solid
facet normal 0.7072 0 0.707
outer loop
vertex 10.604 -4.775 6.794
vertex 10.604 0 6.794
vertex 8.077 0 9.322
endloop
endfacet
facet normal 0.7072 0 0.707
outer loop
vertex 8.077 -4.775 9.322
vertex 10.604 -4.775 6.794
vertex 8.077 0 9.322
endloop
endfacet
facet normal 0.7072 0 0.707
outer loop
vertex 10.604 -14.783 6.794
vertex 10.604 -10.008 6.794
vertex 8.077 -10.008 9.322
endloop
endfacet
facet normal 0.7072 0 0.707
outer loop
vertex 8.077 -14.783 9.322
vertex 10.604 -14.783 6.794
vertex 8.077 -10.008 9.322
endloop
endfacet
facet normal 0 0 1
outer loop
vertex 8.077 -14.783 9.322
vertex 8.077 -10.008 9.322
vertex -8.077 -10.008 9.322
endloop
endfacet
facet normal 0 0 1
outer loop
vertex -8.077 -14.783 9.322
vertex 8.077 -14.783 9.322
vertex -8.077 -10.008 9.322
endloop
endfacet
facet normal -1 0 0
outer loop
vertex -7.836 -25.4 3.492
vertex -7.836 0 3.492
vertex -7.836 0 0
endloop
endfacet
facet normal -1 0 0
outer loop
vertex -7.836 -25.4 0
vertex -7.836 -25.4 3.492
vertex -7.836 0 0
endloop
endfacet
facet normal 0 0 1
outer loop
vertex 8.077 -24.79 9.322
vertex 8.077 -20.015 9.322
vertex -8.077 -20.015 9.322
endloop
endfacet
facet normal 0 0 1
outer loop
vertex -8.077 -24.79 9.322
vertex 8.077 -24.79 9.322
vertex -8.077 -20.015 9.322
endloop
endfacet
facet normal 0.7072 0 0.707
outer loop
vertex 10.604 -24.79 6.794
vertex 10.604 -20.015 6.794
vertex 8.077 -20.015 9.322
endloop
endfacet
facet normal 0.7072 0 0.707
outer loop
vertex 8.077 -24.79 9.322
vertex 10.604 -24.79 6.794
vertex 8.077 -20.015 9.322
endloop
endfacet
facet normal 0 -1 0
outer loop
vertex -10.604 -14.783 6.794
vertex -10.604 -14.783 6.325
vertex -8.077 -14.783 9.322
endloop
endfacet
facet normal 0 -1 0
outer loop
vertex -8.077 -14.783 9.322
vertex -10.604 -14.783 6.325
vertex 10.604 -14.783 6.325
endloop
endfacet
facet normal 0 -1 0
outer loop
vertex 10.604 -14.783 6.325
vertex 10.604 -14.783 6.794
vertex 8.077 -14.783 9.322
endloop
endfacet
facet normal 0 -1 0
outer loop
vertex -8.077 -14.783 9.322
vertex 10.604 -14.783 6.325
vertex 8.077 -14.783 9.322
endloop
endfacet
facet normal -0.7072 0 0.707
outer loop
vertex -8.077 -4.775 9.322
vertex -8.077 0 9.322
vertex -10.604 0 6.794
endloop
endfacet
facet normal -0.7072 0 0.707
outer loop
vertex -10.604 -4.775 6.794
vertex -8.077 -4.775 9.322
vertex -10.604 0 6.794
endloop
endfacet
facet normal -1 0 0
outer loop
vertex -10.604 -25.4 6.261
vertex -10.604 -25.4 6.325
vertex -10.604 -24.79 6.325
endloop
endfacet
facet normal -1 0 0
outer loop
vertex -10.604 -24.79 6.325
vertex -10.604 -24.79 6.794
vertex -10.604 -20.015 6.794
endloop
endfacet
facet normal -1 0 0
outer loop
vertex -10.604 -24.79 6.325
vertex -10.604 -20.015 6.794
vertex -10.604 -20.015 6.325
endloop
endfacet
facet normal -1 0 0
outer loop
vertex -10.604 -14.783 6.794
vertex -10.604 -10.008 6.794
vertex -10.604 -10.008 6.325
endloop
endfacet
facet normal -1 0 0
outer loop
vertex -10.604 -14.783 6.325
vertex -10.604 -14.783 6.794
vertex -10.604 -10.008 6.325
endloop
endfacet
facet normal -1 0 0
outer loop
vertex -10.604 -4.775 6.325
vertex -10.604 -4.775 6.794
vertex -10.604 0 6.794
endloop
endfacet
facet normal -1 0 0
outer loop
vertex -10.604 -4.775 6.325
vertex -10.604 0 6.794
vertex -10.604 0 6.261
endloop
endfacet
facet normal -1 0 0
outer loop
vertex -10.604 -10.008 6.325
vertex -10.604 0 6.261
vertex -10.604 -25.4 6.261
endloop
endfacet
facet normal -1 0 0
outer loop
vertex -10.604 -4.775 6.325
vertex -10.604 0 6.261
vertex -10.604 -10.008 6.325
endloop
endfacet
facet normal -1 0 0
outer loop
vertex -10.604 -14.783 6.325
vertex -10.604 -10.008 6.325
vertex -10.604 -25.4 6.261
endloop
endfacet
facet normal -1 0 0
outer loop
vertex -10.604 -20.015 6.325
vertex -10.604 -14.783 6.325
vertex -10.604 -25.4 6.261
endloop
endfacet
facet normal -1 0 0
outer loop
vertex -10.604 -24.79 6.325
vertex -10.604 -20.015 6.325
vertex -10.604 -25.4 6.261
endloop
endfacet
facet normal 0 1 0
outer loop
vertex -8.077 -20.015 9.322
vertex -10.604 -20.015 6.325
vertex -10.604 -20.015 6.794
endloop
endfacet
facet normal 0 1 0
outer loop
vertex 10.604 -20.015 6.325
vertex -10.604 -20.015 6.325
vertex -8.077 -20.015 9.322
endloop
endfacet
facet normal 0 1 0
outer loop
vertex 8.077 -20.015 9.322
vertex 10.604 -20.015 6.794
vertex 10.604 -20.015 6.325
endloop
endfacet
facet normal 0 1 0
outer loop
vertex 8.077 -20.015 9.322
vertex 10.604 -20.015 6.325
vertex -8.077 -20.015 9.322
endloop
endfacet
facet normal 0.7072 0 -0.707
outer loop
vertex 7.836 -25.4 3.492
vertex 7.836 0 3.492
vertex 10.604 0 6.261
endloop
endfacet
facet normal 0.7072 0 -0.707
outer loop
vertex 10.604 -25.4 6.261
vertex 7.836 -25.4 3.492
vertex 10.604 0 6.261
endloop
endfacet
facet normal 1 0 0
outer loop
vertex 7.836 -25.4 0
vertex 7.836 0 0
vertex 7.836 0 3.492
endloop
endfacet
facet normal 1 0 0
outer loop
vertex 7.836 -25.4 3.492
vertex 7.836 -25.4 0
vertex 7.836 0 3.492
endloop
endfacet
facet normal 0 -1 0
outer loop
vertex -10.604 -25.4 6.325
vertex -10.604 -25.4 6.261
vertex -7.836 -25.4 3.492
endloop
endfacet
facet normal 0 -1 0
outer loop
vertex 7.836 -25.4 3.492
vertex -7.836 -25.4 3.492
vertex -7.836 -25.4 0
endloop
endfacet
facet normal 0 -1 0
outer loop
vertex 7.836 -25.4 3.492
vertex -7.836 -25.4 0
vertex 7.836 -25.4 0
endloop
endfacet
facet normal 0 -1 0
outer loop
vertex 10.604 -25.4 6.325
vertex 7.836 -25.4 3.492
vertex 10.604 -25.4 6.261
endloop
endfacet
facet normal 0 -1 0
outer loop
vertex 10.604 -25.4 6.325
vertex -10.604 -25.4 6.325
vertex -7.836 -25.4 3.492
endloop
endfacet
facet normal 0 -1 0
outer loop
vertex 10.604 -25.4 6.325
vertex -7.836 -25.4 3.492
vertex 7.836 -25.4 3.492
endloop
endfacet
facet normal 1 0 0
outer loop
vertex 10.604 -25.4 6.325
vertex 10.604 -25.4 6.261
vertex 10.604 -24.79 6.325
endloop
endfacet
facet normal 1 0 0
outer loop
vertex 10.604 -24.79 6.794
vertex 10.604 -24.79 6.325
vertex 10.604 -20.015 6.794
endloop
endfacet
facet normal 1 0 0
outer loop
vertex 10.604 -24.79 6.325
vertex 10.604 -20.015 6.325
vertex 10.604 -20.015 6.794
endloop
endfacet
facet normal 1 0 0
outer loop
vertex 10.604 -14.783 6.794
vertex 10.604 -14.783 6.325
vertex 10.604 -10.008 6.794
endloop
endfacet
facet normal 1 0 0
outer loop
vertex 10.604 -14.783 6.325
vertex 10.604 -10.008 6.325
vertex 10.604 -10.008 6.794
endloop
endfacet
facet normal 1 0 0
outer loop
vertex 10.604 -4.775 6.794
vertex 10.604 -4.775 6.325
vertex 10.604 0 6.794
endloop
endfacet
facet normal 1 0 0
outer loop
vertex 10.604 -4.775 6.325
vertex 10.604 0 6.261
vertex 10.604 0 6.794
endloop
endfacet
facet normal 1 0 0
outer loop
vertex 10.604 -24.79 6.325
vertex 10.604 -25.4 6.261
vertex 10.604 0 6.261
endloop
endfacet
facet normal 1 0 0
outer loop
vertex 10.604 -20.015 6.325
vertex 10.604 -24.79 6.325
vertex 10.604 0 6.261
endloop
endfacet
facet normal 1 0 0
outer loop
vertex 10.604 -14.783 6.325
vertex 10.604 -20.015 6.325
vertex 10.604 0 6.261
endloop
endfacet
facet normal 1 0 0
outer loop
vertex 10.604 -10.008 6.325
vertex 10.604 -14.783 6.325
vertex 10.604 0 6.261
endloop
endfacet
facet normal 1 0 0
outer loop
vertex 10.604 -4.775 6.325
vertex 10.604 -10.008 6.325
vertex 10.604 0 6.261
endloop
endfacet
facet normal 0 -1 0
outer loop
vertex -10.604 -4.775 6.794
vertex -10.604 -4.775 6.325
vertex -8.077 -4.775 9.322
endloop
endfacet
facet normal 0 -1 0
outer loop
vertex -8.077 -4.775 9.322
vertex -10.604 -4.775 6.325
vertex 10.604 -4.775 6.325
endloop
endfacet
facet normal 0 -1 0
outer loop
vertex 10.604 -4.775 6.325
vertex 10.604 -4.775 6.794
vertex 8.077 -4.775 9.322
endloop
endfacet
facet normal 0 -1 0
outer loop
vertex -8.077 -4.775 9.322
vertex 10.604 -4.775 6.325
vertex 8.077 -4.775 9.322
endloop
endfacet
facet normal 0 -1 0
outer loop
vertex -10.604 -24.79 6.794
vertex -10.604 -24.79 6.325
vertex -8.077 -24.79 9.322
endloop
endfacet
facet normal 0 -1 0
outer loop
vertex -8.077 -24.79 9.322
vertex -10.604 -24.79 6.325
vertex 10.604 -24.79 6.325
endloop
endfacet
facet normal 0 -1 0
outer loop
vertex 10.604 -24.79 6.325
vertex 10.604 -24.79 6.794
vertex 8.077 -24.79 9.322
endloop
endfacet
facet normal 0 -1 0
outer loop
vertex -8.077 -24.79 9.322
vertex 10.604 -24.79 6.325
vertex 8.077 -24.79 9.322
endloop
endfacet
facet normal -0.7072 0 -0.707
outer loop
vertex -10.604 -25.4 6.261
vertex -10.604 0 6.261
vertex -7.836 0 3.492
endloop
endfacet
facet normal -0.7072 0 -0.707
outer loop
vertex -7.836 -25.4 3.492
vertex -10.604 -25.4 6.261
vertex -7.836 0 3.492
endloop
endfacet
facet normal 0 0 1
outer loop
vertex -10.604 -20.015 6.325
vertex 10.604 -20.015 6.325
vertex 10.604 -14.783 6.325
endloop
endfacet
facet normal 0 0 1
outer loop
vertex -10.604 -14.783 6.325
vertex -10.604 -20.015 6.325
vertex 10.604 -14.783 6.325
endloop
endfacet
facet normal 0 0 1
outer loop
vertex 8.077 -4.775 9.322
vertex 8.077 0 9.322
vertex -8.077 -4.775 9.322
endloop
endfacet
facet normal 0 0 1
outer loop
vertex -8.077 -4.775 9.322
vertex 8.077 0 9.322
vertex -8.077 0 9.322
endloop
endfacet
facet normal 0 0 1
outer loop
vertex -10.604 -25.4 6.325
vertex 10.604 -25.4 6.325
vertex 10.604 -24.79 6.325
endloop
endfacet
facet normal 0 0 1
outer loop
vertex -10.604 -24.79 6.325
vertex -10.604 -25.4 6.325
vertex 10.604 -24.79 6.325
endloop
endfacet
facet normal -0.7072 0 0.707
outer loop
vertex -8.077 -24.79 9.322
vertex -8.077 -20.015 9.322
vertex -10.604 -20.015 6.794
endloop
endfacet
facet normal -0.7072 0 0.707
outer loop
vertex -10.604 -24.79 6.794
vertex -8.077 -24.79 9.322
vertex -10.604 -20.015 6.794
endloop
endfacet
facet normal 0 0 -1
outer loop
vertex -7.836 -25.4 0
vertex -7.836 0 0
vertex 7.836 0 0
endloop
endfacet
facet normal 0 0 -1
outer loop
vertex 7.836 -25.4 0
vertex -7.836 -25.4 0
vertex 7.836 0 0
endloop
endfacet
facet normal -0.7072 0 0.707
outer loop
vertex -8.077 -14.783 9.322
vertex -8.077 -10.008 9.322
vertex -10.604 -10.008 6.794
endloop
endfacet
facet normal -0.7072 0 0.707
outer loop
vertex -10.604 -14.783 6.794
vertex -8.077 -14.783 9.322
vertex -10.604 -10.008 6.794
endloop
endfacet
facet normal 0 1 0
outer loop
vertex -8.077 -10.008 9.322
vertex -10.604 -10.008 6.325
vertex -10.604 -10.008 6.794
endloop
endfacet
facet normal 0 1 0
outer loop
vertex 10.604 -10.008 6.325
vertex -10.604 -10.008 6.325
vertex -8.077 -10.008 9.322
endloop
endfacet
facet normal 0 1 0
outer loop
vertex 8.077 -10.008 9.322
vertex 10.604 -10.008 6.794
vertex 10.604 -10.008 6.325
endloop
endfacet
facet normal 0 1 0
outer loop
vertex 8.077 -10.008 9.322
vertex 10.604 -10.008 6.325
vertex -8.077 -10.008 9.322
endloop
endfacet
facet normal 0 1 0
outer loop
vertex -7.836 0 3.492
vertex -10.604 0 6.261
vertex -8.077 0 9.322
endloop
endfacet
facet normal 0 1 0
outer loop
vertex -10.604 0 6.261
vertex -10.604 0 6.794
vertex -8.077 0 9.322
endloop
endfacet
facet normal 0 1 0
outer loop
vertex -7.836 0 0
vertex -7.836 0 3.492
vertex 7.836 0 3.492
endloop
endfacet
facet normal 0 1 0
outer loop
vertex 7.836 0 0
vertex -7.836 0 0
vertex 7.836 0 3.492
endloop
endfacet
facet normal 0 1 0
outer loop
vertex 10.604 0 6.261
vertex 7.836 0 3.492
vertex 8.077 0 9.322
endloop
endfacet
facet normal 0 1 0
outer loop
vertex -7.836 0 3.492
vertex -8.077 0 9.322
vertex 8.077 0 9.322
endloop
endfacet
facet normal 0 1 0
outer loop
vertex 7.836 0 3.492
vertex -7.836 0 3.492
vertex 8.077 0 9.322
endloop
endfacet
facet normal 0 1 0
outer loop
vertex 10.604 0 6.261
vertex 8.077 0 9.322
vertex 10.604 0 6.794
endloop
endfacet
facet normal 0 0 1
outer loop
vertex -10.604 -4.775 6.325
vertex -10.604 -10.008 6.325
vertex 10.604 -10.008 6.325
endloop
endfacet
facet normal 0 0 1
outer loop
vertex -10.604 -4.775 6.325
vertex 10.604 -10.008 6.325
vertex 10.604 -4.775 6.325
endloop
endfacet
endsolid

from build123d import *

# Parameters (mm, degrees)
F1_DEPTH = 25.4
F2_W     = 5.2324
F2_H     = 2.9972
F3_DEPTH = 21.21


with BuildPart() as f1:
    # F0 (on Front) → F1 (new body)
    with BuildSketch(Plane.XZ):
        Polygon((-7.8359, 3.4925), (-7.8359, 0), (7.8359, 0), (7.8359, 3.4925), (10.6045, 6.2611), (10.6045, 6.7945), (8.0772, 9.3218), (-8.0772, 9.3218), (-10.6045, 6.7945), (-10.6045, 6.2611), align=None)
    extrude(amount=F1_DEPTH)

    # F2 (on face) → F3 (cut, through all)
    with BuildSketch(Plane.YZ.offset(10.6045)):
        with Locations((2.6162, 7.8232)):
            Rectangle(F2_W, F2_H)
        with Locations((-7.3914, 7.8232)):
            Rectangle(F2_W, F2_H)
        with Locations((-17.399, 7.8232)):
            Rectangle(F2_W, F2_H)
        with Locations((-27.4066, 7.8232)):
            Rectangle(F2_W, F2_H)
    extrude(amount=-F3_DEPTH, mode=Mode.SUBTRACT)


solid = f1.part
